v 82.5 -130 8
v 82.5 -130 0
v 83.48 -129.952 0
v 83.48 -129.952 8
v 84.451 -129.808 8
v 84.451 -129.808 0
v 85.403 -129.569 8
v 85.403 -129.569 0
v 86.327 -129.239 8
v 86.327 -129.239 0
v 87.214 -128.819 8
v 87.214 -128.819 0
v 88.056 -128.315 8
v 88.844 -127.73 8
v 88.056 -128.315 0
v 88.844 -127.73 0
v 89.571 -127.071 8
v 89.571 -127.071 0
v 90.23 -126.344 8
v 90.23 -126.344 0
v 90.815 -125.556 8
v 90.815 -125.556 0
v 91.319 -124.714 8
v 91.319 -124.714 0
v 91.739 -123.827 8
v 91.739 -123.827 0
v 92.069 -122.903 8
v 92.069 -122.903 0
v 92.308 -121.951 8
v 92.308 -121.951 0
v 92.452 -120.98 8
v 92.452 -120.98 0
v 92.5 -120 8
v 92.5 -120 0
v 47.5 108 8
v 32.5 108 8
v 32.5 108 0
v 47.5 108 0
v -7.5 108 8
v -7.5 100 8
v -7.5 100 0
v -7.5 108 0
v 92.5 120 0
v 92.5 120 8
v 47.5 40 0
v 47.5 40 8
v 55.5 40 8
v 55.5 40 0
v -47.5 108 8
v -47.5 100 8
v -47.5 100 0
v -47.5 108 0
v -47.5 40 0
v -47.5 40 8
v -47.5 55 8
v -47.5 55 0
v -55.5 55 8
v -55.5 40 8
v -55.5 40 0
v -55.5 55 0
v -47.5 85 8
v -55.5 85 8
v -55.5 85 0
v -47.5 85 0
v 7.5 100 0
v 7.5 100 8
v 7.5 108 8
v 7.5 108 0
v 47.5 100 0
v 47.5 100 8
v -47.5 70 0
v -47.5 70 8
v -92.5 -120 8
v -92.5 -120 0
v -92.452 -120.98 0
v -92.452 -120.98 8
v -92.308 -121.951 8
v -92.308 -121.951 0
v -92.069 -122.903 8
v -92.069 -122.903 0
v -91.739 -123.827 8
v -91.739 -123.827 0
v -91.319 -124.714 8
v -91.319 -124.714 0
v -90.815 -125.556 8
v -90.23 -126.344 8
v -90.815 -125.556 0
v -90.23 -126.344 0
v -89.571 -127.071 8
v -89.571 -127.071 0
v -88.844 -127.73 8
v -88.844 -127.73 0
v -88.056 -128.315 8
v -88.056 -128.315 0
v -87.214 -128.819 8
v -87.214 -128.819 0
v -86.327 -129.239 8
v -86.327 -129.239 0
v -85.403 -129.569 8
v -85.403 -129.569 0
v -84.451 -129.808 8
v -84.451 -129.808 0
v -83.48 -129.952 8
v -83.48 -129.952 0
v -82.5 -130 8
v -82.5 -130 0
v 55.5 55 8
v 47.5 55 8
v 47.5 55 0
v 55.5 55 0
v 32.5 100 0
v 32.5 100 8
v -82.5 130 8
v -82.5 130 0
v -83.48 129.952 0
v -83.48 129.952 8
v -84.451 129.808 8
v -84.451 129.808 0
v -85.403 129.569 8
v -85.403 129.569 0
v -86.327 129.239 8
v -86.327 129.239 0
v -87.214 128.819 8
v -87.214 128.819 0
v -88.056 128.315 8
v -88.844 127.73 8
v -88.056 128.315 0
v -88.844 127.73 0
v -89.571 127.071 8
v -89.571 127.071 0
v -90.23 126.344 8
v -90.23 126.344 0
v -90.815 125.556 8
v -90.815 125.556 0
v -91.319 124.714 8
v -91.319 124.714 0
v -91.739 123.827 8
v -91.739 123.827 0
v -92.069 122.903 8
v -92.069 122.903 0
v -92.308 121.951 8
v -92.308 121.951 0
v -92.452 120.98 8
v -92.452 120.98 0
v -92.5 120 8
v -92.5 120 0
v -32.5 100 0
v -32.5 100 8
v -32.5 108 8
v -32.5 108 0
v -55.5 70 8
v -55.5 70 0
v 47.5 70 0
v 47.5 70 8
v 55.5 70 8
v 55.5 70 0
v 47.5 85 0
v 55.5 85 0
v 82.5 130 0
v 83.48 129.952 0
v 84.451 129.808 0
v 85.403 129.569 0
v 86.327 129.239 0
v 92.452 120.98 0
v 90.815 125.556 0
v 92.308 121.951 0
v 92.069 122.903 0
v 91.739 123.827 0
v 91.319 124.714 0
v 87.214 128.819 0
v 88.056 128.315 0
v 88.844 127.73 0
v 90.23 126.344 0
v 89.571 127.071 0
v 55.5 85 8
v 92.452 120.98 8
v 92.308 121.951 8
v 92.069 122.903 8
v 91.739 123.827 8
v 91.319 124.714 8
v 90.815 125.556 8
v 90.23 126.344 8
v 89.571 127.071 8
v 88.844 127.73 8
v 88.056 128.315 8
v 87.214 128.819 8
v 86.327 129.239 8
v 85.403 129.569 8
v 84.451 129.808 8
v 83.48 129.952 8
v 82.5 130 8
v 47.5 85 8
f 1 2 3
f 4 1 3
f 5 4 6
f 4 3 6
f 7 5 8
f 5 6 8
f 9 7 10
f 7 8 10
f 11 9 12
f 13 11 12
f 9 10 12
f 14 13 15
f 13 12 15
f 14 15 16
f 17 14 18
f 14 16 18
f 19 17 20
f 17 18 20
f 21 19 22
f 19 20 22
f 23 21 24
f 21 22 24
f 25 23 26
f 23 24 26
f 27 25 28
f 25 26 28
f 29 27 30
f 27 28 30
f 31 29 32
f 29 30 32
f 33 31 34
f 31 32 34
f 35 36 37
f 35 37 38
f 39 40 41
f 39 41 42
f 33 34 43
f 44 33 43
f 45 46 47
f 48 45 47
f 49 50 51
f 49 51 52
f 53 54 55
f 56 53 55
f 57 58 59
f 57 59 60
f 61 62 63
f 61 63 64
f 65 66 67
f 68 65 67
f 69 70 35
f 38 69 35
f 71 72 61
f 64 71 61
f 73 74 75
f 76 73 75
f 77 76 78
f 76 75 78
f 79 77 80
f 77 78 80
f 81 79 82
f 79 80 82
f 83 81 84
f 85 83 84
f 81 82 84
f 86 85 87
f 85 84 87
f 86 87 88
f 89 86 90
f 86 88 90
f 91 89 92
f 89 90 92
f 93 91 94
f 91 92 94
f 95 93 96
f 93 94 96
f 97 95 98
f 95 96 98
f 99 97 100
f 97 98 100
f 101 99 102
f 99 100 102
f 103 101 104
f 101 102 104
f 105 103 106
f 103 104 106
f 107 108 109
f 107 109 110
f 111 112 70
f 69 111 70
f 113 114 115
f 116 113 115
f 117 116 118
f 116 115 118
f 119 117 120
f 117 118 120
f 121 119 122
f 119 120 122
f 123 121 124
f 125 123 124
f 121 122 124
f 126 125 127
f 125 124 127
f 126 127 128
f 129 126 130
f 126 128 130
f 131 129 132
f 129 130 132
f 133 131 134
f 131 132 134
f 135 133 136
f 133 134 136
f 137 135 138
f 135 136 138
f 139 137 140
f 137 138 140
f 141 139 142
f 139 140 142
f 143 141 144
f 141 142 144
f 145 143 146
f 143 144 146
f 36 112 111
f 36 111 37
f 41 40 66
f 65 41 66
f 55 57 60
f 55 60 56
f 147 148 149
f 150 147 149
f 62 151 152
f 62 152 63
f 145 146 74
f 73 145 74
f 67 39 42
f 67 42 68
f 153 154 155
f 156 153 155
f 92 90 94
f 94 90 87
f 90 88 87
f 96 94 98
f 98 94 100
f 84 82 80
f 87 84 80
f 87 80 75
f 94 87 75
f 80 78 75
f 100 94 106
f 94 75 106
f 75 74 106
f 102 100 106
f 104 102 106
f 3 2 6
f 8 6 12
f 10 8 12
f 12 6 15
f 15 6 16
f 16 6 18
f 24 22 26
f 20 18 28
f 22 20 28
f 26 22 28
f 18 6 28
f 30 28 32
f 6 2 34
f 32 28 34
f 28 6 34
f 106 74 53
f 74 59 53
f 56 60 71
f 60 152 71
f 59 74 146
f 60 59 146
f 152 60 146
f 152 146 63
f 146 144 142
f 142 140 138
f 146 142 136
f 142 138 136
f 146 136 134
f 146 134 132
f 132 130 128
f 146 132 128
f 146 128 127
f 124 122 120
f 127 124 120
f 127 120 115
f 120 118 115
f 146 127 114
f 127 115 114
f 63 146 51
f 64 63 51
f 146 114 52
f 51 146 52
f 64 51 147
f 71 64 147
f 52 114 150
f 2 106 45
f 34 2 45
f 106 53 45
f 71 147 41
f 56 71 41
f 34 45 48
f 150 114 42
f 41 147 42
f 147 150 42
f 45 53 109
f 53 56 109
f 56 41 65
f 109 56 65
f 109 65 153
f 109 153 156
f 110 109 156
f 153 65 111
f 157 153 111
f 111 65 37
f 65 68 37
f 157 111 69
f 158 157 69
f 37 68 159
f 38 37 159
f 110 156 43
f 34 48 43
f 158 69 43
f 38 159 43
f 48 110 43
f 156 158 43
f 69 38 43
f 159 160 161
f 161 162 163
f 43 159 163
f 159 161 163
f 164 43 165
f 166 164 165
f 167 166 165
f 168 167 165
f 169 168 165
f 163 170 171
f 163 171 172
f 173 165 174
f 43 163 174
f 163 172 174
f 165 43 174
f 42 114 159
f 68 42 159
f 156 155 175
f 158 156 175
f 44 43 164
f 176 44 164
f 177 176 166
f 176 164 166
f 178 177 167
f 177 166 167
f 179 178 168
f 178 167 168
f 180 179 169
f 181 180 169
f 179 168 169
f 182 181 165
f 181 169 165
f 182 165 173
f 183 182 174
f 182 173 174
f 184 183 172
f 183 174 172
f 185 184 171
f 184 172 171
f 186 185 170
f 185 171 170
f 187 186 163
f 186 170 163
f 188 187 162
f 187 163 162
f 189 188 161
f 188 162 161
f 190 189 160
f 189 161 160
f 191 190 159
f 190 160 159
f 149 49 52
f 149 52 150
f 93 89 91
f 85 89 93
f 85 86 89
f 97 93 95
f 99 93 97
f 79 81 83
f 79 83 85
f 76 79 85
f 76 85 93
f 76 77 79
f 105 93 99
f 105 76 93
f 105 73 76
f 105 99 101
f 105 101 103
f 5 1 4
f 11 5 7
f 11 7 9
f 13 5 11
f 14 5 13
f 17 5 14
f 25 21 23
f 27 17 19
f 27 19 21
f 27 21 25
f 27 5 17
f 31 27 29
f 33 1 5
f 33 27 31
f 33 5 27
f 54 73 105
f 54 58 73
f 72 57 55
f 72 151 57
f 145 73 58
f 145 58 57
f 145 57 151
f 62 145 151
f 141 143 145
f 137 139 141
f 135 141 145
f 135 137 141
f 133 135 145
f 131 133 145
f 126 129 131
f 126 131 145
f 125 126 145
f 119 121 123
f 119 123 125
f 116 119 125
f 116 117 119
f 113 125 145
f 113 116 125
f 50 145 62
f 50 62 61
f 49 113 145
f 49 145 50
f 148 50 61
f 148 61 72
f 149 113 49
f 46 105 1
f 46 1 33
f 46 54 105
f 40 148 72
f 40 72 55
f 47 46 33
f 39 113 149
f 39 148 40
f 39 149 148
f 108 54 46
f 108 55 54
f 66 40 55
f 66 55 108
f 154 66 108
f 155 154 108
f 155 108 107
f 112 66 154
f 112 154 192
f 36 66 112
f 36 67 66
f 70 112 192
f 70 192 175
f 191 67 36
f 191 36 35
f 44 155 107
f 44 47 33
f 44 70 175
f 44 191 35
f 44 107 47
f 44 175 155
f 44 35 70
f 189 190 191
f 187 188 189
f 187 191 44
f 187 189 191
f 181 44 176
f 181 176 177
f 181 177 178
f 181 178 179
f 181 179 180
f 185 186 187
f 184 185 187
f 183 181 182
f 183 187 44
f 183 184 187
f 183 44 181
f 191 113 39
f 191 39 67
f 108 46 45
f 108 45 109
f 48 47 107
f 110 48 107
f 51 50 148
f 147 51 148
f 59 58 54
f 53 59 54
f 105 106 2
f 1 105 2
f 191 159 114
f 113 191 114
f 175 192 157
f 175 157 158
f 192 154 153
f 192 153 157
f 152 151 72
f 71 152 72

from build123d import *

# Parameters (mm, degrees)
BOSS_EXTRUDE1_DEPTH = 8
SKETCH2_W           = 15
SKETCH2_H           = 8
SKETCH2_W_2         = 8
SKETCH2_H_2         = 15
CUT_EXTRUDE1_DEPTH  = 160.750586853


with BuildPart() as part:
    # Sketch1 → Boss-Extrude1 (new body)
    with BuildSketch(Plane.XY):
        with BuildLine():
            Line((-82.5, -130), (82.5, -130))
            ThreePointArc((82.5, -130), (89.571067812, -127.071067812), (92.5, -120))
            Line((92.5, -120), (92.5, 120))
            ThreePointArc((92.5, 120), (89.571067812, 127.071067812), (82.5, 130))
            Line((82.5, 130), (-82.5, 130))
            ThreePointArc((-82.5, 130), (-89.571067812, 127.071067812), (-92.5, 120))
            Line((-92.5, 120), (-92.5, -120))
            ThreePointArc((-92.5, -120), (-89.571067812, -127.071067812), (-82.5, -130))
        make_face()
    extrude(amount=BOSS_EXTRUDE1_DEPTH)

    # Sketch2 → Cut-Extrude1 (cut, through all)
    with BuildSketch(Plane.XY.offset(8)):
        with Locations((0, 104)):
            Rectangle(SKETCH2_W, SKETCH2_H)
        with Locations((-40, 104)):
            Rectangle(SKETCH2_W, SKETCH2_H)
        with Locations((40, 104)):
            Rectangle(SKETCH2_W, SKETCH2_H)
        with Locations((-51.5, 47.5)):
            Rectangle(SKETCH2_W_2, SKETCH2_H_2)
        with Locations((-51.5, 77.5)):
            Rectangle(SKETCH2_W_2, SKETCH2_H_2)
        with Locations((51.5, 47.5)):
            Rectangle(SKETCH2_W_2, SKETCH2_H_2)
        with Locations((51.5, 77.5)):
            Rectangle(SKETCH2_W_2, SKETCH2_H_2)
    extrude(amount=-CUT_EXTRUDE1_DEPTH, mode=Mode.SUBTRACT)


solid = part.part
